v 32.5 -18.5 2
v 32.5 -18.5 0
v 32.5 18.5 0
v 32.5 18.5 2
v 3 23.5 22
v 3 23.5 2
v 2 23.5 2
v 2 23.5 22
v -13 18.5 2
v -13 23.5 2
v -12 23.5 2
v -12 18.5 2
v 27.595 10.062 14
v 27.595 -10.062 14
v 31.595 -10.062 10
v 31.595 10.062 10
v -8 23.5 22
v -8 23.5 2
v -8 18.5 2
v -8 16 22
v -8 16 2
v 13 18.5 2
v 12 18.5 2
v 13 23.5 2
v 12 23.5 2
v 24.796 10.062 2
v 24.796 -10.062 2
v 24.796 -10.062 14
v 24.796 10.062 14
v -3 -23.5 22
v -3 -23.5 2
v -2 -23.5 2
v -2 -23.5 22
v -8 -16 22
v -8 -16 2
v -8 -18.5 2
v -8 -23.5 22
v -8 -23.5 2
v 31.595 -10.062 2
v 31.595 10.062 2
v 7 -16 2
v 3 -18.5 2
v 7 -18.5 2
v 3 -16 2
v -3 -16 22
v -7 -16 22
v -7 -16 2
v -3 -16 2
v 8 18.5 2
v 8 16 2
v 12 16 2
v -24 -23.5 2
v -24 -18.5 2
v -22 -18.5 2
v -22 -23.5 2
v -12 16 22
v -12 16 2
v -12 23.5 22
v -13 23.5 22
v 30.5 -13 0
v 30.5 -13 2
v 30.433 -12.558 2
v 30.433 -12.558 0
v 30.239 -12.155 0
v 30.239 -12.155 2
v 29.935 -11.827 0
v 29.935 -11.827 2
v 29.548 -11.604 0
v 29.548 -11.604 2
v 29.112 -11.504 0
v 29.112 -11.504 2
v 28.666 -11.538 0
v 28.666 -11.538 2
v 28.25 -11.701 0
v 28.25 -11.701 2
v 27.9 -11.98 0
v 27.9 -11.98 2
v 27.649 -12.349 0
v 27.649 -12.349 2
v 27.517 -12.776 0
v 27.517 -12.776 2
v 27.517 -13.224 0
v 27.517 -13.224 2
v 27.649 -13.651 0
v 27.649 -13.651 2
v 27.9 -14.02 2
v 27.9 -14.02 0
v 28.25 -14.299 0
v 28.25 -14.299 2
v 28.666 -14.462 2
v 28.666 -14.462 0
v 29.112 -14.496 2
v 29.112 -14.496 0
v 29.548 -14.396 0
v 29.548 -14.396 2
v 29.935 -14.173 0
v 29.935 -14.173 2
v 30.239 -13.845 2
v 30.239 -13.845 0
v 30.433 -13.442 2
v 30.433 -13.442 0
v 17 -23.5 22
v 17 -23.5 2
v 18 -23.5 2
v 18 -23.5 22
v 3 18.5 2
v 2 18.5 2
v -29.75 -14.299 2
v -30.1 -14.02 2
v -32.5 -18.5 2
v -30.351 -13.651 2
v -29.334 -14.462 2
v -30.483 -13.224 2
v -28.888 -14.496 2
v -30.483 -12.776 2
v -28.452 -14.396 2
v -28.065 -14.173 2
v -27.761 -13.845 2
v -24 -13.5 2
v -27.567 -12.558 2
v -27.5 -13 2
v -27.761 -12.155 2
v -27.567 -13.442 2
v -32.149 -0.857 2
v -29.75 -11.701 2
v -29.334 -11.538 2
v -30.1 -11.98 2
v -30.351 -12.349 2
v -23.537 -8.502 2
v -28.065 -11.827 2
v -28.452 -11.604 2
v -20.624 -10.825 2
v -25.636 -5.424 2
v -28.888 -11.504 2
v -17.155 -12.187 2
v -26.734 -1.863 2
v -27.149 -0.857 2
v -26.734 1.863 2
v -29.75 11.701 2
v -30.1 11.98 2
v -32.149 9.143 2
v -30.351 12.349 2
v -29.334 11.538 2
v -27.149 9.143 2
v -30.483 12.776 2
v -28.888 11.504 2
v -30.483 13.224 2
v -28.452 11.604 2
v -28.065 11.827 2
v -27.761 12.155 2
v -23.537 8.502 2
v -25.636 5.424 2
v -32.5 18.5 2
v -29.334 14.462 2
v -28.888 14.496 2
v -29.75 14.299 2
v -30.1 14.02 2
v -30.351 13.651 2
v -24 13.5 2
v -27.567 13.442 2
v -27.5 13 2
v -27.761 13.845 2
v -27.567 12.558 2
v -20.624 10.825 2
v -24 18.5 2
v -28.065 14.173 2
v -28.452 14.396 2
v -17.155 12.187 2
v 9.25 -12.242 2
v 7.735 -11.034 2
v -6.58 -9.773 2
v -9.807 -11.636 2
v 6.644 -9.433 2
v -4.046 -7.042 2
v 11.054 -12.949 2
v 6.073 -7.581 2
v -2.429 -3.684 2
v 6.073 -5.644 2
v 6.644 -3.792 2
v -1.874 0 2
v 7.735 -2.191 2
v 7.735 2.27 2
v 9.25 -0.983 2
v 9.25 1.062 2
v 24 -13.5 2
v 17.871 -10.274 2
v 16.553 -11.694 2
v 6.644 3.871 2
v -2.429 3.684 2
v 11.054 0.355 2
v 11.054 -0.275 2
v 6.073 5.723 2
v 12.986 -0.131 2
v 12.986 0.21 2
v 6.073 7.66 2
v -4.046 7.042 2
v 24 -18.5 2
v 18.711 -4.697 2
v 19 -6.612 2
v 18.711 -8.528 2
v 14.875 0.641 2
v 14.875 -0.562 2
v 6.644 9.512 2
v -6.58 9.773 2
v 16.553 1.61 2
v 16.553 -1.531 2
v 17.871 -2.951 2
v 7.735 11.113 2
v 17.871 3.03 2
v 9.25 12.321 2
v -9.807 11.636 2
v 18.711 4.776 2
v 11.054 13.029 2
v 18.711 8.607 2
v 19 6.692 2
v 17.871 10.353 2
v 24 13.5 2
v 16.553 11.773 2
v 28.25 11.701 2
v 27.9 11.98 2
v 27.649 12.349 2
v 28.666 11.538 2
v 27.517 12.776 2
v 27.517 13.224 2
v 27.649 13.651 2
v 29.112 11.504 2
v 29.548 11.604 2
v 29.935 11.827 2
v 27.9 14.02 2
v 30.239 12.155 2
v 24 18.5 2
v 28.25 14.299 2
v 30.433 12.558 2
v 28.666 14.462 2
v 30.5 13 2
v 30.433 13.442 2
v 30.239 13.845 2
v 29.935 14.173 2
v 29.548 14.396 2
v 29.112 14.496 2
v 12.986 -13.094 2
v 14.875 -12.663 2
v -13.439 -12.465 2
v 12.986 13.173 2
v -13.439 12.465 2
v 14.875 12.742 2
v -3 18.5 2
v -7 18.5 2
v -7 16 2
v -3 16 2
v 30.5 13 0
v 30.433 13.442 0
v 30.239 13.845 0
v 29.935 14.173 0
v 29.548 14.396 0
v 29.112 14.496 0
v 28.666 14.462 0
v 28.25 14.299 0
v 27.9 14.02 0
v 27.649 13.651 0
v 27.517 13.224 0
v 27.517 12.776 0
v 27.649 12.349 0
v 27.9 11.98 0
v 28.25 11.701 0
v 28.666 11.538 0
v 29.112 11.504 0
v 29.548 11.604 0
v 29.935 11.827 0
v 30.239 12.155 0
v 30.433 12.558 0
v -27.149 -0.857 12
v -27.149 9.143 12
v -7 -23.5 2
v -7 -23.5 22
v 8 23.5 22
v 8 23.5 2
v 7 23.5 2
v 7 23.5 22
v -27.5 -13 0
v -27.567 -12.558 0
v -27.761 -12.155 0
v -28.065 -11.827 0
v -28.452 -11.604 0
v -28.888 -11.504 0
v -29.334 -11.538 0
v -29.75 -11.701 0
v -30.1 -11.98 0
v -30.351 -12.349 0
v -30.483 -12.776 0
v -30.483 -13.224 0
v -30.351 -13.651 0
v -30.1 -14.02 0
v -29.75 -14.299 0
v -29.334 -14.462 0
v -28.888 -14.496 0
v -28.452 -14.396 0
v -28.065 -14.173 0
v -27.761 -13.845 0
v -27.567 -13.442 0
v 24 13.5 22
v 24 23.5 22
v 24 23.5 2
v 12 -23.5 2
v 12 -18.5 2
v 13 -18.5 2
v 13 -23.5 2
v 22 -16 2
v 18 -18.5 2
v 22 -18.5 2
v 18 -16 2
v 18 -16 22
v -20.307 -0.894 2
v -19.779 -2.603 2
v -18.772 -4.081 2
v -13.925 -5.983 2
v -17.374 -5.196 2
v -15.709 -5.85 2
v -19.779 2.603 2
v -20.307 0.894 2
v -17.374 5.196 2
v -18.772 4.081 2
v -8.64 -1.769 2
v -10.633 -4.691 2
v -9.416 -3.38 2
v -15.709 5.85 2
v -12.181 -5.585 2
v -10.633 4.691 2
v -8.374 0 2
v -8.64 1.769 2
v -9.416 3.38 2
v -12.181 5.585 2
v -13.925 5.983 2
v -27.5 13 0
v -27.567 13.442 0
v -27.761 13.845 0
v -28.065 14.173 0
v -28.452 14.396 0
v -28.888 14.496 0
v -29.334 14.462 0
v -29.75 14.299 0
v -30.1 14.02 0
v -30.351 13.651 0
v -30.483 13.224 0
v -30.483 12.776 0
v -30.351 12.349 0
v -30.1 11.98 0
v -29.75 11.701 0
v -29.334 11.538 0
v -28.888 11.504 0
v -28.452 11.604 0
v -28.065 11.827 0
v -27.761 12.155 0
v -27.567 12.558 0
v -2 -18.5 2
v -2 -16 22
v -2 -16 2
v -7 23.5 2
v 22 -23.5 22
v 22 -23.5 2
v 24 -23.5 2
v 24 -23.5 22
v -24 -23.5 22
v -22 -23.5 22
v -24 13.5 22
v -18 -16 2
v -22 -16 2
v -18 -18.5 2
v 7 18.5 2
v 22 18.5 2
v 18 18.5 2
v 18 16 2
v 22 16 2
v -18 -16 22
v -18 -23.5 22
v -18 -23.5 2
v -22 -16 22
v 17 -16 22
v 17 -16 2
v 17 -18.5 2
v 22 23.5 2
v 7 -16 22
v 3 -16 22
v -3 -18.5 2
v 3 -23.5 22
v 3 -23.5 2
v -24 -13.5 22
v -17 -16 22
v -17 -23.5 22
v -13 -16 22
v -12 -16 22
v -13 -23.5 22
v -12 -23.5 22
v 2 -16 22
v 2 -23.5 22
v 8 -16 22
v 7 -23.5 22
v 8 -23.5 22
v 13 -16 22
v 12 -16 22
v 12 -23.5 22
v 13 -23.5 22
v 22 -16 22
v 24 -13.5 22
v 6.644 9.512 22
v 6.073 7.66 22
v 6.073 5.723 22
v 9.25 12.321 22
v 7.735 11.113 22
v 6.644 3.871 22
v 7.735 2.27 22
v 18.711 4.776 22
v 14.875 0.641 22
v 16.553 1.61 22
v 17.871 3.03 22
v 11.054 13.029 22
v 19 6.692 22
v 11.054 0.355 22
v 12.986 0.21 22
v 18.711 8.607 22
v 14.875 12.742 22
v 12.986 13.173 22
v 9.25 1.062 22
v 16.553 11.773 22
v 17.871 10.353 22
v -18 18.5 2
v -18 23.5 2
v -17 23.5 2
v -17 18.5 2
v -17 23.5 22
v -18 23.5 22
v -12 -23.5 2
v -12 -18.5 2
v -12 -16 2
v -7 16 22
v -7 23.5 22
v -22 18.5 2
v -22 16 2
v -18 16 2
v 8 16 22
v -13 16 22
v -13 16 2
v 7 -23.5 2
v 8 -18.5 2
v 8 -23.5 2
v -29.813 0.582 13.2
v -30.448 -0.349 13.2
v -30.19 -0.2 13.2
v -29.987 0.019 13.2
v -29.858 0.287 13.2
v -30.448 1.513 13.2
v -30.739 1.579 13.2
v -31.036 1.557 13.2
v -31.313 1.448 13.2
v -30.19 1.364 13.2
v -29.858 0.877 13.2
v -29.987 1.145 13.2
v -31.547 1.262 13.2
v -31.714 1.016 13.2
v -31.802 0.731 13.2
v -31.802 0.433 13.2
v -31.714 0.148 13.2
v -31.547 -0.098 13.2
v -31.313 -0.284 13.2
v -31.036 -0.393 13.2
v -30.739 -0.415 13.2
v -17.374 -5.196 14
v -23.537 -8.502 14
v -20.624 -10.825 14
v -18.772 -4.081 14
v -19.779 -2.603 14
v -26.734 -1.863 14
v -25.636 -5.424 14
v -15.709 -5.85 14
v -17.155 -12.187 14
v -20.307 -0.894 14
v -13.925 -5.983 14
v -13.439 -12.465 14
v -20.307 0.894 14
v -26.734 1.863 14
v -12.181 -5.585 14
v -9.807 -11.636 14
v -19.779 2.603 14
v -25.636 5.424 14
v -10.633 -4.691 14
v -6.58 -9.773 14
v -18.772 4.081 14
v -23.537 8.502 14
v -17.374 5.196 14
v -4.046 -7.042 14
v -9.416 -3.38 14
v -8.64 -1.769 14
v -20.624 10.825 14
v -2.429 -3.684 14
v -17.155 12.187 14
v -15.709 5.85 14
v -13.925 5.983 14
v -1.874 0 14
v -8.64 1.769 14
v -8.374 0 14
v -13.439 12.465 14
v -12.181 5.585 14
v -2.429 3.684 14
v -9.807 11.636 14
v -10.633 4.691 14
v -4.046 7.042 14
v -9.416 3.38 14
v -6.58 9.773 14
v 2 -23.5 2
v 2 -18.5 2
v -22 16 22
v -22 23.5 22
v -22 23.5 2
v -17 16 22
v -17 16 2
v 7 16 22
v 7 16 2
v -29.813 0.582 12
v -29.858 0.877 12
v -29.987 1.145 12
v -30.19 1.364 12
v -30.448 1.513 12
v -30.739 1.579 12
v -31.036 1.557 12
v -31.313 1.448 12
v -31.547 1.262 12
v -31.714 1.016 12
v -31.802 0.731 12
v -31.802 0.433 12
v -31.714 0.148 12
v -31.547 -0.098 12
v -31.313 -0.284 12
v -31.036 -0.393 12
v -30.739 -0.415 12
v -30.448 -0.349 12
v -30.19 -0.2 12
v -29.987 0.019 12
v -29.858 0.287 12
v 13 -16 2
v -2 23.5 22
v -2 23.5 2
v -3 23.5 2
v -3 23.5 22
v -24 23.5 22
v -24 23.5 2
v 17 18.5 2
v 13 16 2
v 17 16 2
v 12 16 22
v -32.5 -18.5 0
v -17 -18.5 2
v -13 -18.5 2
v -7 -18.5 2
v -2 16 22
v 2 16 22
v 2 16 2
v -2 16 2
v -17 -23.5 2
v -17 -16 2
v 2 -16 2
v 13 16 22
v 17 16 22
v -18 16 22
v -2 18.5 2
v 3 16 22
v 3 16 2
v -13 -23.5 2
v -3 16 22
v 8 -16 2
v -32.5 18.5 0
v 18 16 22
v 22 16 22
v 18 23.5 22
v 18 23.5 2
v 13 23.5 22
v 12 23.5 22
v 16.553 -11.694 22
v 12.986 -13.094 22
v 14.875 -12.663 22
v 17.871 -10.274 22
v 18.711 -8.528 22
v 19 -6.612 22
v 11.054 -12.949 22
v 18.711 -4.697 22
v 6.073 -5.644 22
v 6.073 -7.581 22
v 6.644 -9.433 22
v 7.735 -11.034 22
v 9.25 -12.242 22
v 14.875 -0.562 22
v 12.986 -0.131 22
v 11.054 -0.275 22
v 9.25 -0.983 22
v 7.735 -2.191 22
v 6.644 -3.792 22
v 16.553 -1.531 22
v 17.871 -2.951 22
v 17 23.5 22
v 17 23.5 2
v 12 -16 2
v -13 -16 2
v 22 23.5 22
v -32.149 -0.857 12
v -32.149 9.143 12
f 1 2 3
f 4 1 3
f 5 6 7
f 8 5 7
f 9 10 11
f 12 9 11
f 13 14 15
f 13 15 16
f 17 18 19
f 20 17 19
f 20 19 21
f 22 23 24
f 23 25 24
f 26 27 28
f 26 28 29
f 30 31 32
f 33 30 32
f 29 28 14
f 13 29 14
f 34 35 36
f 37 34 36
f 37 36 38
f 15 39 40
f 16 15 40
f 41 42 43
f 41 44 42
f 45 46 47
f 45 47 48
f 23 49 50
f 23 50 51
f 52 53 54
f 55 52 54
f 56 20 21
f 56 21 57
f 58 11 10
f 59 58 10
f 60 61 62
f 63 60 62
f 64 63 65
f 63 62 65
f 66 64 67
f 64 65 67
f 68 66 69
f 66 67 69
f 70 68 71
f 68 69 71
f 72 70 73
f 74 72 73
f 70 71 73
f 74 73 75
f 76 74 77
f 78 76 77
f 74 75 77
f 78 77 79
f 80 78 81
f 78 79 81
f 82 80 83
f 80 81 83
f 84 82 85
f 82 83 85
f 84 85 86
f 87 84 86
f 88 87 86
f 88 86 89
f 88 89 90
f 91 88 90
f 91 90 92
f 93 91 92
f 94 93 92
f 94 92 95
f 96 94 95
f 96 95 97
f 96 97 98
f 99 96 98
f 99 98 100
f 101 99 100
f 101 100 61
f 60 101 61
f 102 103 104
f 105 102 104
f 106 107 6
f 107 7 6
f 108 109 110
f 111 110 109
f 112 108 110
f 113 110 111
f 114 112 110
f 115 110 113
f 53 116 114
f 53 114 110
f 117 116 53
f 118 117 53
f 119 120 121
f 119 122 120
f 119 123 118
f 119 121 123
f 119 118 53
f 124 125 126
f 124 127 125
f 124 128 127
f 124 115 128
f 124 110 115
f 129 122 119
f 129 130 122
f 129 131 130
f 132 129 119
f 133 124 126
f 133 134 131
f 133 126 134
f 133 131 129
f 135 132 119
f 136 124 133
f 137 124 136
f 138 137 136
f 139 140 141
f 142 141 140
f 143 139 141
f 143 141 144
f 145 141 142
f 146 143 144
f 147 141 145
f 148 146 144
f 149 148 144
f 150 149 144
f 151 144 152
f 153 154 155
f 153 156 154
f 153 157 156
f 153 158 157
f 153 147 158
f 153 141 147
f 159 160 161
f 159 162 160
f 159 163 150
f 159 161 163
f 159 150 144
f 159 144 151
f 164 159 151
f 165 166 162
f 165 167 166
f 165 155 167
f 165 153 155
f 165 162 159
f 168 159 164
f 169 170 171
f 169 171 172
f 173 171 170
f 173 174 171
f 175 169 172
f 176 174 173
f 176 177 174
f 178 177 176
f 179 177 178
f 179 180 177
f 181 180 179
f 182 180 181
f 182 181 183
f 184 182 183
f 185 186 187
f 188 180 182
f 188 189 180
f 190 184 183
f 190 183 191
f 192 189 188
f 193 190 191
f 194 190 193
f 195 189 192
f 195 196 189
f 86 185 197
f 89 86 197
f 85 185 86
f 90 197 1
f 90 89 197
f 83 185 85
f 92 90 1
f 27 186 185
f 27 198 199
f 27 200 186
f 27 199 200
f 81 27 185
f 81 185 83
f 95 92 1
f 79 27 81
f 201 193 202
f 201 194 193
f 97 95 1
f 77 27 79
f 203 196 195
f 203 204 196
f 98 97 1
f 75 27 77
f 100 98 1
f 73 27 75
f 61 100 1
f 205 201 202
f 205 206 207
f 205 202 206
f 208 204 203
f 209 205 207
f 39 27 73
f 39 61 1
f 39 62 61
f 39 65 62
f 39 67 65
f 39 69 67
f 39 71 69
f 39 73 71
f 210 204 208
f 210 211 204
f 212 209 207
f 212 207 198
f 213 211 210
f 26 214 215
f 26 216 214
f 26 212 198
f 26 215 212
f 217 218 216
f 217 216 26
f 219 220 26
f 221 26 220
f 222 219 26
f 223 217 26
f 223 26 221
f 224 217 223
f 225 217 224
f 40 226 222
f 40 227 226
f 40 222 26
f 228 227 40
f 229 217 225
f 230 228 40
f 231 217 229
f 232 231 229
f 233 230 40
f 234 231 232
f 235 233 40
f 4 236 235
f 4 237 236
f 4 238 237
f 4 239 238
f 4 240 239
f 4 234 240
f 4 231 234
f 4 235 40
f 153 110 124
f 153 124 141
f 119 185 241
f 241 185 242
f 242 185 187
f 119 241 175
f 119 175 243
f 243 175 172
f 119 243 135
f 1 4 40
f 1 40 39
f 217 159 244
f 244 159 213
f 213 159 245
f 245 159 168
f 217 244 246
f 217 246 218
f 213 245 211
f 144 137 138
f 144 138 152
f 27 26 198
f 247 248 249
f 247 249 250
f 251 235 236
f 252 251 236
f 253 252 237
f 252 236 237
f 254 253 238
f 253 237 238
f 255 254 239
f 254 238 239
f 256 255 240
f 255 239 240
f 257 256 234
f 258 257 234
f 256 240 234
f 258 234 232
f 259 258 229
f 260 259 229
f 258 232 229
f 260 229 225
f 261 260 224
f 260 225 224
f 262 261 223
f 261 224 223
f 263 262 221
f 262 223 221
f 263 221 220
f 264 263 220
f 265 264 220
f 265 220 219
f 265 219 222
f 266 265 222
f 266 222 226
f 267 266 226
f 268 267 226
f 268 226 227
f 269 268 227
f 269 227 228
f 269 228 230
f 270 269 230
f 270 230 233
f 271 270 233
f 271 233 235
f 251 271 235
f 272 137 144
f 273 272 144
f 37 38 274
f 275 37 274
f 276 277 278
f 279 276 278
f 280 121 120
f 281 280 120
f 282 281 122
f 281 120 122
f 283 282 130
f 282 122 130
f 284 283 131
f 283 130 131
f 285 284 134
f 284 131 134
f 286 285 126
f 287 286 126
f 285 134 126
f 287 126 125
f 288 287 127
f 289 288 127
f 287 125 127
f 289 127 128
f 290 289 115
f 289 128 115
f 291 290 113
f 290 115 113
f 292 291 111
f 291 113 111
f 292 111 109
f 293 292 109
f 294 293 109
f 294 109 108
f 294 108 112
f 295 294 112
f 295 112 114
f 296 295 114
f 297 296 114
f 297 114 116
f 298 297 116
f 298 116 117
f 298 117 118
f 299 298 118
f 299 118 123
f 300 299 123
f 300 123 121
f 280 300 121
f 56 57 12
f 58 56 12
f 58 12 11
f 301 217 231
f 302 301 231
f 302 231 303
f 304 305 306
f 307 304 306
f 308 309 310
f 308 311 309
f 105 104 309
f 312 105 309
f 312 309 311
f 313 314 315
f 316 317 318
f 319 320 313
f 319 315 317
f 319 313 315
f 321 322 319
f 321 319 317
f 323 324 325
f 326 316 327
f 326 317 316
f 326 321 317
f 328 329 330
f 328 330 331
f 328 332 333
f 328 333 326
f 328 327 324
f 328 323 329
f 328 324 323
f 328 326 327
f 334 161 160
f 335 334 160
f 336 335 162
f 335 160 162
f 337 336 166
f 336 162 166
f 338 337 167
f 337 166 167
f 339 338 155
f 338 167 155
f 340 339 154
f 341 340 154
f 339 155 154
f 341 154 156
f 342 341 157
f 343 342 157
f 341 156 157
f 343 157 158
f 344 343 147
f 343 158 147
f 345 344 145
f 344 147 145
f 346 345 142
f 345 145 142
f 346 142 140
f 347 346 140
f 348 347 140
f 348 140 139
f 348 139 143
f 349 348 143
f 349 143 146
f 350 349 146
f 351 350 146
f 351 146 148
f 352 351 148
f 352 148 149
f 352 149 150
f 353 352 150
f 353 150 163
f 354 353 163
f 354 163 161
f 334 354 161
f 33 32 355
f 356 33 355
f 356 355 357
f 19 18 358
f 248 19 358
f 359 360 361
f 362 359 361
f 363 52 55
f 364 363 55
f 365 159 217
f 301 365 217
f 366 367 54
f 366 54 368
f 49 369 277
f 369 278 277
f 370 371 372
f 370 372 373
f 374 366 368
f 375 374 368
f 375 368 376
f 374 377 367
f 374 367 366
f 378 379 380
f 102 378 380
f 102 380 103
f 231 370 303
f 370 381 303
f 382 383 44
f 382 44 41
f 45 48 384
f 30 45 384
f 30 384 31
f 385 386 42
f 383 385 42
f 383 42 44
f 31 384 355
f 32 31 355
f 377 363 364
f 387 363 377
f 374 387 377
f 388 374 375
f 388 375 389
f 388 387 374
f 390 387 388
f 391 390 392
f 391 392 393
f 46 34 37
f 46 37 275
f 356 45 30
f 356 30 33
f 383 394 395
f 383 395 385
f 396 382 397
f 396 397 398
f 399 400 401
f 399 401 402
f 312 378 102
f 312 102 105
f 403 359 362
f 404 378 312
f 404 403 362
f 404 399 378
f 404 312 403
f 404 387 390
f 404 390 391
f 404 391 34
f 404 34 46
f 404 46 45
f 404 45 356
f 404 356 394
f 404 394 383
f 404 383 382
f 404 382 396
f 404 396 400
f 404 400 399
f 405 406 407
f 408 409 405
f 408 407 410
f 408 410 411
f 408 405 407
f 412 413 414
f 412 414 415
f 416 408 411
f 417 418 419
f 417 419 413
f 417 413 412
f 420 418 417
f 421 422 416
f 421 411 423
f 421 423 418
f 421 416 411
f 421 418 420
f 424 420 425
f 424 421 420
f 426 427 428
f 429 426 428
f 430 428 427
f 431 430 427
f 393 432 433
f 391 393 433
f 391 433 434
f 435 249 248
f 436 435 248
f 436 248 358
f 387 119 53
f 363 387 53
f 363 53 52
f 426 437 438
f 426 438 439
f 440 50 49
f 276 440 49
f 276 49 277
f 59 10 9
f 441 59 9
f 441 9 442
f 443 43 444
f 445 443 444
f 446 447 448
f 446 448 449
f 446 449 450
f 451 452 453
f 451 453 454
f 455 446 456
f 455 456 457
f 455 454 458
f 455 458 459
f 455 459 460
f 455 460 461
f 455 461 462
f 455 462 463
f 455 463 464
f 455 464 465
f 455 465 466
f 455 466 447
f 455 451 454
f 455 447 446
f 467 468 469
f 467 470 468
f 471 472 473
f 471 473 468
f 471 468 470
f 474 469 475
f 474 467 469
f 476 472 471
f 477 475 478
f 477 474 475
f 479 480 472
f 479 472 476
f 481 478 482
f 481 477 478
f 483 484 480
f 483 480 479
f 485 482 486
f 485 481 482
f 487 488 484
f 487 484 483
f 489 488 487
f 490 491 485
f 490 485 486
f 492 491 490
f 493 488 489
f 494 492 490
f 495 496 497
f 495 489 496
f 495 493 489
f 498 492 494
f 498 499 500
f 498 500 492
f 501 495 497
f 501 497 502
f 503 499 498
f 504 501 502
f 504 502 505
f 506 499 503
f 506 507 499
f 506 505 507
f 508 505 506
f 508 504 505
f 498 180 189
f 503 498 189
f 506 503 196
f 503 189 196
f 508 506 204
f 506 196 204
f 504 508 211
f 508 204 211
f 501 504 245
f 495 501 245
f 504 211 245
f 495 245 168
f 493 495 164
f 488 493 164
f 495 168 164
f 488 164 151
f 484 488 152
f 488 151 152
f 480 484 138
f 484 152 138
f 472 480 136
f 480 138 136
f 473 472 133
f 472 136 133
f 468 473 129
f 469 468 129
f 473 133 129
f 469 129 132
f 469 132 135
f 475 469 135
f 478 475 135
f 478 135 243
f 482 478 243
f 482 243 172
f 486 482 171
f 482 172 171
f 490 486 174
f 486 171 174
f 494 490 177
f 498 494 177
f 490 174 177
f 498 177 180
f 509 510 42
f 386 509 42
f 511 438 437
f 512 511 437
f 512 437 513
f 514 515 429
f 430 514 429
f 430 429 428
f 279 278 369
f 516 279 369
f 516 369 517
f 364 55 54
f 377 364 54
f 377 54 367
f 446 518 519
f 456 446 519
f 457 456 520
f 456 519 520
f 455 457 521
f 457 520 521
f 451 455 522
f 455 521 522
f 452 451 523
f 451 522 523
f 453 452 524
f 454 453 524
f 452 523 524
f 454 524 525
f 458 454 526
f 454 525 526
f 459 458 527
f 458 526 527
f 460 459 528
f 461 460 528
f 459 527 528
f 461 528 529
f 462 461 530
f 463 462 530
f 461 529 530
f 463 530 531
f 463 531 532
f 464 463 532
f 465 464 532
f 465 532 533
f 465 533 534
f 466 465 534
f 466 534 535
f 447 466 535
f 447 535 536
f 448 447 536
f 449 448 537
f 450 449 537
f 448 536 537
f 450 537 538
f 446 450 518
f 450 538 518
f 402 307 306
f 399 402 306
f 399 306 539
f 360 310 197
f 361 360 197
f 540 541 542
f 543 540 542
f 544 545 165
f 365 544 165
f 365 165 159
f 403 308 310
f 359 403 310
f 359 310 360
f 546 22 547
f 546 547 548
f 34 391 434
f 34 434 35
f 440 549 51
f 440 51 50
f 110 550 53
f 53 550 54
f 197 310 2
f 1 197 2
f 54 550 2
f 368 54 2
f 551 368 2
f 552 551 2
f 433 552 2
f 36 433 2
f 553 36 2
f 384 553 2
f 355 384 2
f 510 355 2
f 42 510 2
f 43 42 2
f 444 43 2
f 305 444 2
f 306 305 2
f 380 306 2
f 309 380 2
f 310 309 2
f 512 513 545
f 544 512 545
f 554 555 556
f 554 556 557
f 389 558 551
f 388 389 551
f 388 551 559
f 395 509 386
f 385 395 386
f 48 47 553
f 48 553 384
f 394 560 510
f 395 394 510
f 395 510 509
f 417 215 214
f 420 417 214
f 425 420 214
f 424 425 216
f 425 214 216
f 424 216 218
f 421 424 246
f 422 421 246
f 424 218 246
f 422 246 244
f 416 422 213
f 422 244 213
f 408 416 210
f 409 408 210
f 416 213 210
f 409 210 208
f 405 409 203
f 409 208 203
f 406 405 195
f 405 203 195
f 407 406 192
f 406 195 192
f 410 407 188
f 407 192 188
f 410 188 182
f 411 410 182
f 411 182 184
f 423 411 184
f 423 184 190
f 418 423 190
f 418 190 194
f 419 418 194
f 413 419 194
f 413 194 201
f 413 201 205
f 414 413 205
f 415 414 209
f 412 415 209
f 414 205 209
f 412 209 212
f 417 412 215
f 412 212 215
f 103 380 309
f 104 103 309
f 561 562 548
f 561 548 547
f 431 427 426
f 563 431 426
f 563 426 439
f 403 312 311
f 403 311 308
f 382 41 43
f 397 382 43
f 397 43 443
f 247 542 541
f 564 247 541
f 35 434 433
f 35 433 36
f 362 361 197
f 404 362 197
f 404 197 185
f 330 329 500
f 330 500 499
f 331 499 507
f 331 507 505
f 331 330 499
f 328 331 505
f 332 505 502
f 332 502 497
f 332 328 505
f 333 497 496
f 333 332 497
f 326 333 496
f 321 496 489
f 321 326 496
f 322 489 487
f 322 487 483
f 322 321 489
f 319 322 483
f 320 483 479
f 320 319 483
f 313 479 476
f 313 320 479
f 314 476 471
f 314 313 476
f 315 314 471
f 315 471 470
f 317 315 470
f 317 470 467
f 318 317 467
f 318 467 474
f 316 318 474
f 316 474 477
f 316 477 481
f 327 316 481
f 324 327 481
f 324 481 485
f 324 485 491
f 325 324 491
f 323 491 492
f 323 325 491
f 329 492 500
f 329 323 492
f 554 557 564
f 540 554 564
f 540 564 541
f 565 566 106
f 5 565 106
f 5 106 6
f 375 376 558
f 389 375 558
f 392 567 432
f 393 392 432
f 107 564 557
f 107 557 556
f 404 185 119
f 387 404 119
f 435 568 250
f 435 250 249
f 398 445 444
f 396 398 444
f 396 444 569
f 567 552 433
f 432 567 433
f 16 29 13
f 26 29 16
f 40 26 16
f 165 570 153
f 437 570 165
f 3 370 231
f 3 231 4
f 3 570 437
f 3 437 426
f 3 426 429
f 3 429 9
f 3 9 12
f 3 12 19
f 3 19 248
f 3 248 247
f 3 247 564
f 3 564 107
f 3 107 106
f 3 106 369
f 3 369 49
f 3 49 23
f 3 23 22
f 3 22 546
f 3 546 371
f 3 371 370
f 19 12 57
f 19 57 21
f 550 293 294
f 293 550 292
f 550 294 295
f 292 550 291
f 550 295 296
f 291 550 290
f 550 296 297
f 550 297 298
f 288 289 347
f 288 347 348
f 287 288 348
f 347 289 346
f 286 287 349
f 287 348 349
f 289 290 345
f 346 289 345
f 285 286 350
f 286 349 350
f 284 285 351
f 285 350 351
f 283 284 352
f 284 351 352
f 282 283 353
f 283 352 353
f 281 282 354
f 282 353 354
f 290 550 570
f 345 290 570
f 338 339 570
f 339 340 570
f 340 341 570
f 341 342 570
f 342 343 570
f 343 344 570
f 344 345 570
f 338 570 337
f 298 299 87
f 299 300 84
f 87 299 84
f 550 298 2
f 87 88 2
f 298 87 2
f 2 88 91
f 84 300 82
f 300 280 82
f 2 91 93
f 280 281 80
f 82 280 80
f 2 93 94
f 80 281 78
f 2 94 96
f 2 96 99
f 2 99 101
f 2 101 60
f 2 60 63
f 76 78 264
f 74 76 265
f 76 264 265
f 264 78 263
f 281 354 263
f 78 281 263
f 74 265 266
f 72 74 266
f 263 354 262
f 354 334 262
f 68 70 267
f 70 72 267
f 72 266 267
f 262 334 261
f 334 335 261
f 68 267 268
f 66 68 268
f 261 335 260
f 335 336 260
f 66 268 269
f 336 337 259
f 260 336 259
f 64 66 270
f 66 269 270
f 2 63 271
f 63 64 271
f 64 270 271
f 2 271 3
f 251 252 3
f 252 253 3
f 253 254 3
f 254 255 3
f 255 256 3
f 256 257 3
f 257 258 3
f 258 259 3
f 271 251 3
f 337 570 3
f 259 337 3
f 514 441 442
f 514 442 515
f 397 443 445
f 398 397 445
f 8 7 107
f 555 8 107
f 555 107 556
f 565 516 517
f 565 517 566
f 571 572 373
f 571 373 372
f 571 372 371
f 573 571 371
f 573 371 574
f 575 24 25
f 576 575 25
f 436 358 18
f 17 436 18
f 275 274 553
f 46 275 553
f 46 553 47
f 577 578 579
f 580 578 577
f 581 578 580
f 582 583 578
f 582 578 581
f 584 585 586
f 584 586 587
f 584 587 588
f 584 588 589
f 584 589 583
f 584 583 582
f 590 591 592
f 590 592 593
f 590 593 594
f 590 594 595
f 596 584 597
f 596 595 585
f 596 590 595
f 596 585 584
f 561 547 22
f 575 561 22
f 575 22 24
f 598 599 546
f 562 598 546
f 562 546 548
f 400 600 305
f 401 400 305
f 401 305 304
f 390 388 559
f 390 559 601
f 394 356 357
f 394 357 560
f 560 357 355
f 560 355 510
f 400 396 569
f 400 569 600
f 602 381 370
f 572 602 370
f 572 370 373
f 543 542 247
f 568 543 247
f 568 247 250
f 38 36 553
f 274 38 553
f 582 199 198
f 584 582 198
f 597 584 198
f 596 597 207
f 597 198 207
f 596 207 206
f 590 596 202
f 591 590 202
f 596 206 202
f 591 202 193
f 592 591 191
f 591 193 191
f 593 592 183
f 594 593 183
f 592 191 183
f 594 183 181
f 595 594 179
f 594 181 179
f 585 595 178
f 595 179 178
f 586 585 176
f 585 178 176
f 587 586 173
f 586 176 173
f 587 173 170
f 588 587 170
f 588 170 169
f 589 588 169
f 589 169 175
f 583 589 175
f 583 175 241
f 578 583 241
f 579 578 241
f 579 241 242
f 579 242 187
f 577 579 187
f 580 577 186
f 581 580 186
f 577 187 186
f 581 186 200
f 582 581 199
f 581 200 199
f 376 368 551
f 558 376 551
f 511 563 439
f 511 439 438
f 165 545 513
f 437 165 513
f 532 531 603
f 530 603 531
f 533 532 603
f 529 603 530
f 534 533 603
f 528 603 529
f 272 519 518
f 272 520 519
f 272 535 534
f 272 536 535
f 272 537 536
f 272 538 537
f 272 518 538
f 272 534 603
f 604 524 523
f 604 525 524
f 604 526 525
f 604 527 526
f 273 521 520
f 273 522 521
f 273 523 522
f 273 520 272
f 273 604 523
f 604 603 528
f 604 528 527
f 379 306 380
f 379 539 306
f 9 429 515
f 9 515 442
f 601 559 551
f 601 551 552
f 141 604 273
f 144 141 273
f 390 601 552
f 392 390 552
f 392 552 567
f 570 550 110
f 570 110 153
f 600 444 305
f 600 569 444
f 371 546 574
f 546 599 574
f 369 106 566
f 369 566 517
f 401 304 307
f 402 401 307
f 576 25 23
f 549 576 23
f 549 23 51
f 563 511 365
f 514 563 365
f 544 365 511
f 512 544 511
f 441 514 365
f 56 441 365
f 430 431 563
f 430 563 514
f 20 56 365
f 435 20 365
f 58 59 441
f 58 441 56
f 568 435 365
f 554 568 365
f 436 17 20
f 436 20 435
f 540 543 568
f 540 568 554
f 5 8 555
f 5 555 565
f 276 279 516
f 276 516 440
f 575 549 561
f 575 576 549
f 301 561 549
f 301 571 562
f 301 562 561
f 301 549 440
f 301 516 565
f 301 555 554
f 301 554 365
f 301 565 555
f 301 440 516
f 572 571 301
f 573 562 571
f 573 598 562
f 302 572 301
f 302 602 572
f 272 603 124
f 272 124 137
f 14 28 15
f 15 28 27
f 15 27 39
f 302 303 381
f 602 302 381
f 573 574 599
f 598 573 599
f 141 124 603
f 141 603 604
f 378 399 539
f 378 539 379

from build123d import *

# Parameters (mm, degrees)
SKETCH_1_W          = 65
SKETCH_1_H          = 37
EXTRUDE_1_DEPTH     = 2
EXTRUDE_2_DEPTH     = 20
SKETCH_3_R          = 6.5
EXTRUDE_3_DEPTH     = 20
SKETCH_4_R          = 12.5
SKETCH_4_R_2        = 6
EXTRUDE_4_DEPTH     = 12
SKETCH_5_W          = 5
SKETCH_5_H          = 10
EXTRUDE_5_DEPTH     = 10
SKETCH_6_R          = 1
EXTRUDE_6_DEPTH     = 1.2
SKETCH_7_W          = 6.798722996
SKETCH_7_H          = 20.12306807
EXTRUDE_7_DEPTH     = 12
CHAMFER_1_SIZE      = 4
SKETCH_8_R          = 1.5
CUT_EXTRUDE_1_DEPTH = 3


with BuildPart() as part:
    # Эскиз1 → Бобышка-Вытянуть1 (new body)
    with BuildSketch(Plane.XY):
        Rectangle(SKETCH_1_W, SKETCH_1_H)
    extrude(amount=EXTRUDE_1_DEPTH)

    # Эскиз2 → Бобышка-Вытянуть2 (add)
    with BuildSketch(Plane.XY.offset(2)):
        Polygon((-24, 23.5), (-24, 13.5), (24, 13.5), (24, 23.5), (22, 23.5), (22, 16), (18, 16), (18, 23.5), (17, 23.5), (17, 16), (13, 16), (13, 23.5), (12, 23.5), (12, 16), (8, 16), (8, 23.5), (7, 23.5), (7, 16), (3, 16), (3, 23.5), (2, 23.5), (2, 16), (-2, 16), (-2, 23.5), (-3, 23.5), (-3, 16), (-7, 16), (-7, 23.5), (-8, 23.5), (-8, 16), (-12, 16), (-12, 23.5), (-13, 23.5), (-13, 16), (-17, 16), (-17, 23.5), (-18, 23.5), (-18, 16), (-22, 16), (-22, 23.5), align=None)
        Polygon((22, -23.5), (24, -23.5), (24, -13.5), (-24, -13.5), (-24, -23.5), (-22, -23.5), (-22, -16), (-18, -16), (-18, -23.5), (-17, -23.5), (-17, -16), (-13, -16), (-13, -23.5), (-12, -23.5), (-12, -16), (-8, -16), (-8, -23.5), (-7, -23.5), (-7, -16), (-3, -16), (-3, -23.5), (-2, -23.5), (-2, -16), (2, -16), (2, -23.5), (3, -23.5), (3, -16), (7, -16), (7, -23.5), (8, -23.5), (8, -16), (12, -16), (12, -23.5), (13, -23.5), (13, -16), (17, -16), (17, -23.5), (18, -23.5), (18, -16), (22, -16), align=None)
    extrude(amount=EXTRUDE_2_DEPTH)

    # Эскиз3 → Бобышка-Вытянуть3 (add)
    with BuildSketch(Plane.XY.offset(2)):
        with Locations((12.5, 6.691570058)):
            Circle(SKETCH_3_R)
        with Locations((12.5, -6.612413993)):
            Circle(SKETCH_3_R)
    extrude(amount=EXTRUDE_3_DEPTH)

    # Эскиз4 → Бобышка-Вытянуть4 (add)
    with BuildSketch(Plane.XY.offset(2)):
        with Locations((-14.373526478, 0)):
            Circle(SKETCH_4_R)
        with Locations((-14.373526478, 0)):
            Circle(SKETCH_4_R_2, mode=Mode.SUBTRACT)
    extrude(amount=EXTRUDE_4_DEPTH)

    # Эскиз5 → Бобышка-Вытянуть5 (add)
    with BuildSketch(Plane.XY.offset(2)):
        with Locations((-29.649429854, 4.142703247)):
            Rectangle(SKETCH_5_W, SKETCH_5_H)
    extrude(amount=EXTRUDE_5_DEPTH)

    # Эскиз6 → Бобышка-Вытянуть6 (add)
    with BuildSketch(Plane.XY.offset(12)):
        with Locations((-30.813495229, 0.582032688)):
            Circle(SKETCH_6_R)
    extrude(amount=EXTRUDE_6_DEPTH)

    # Эскиз7 → Бобышка-Вытянуть7 (add)
    with BuildSketch(Plane.XY.offset(2)):
        with Locations((28.195350692, 0)):
            Rectangle(SKETCH_7_W, SKETCH_7_H)
    extrude(amount=EXTRUDE_7_DEPTH)

    # Фаска1
    chamfer_1_edges = [part.edges().sort_by_distance(p)[0] for p in [
        (31.59471219, 0, 14),
    ]]
    chamfer(chamfer_1_edges, length=CHAMFER_1_SIZE)

    # Эскиз8 → Вырез-Вытянуть1 (cut, through all)
    with BuildSketch(Plane.XY.offset(2)):
        with Locations((-29, 13)):
            Circle(SKETCH_8_R)
        with Locations((29, 13)):
            Circle(SKETCH_8_R)
        with Locations((29, -13)):
            Circle(SKETCH_8_R)
        with Locations((-29, -13)):
            Circle(SKETCH_8_R)
    extrude(amount=-CUT_EXTRUDE_1_DEPTH, mode=Mode.SUBTRACT)


solid = part.part
